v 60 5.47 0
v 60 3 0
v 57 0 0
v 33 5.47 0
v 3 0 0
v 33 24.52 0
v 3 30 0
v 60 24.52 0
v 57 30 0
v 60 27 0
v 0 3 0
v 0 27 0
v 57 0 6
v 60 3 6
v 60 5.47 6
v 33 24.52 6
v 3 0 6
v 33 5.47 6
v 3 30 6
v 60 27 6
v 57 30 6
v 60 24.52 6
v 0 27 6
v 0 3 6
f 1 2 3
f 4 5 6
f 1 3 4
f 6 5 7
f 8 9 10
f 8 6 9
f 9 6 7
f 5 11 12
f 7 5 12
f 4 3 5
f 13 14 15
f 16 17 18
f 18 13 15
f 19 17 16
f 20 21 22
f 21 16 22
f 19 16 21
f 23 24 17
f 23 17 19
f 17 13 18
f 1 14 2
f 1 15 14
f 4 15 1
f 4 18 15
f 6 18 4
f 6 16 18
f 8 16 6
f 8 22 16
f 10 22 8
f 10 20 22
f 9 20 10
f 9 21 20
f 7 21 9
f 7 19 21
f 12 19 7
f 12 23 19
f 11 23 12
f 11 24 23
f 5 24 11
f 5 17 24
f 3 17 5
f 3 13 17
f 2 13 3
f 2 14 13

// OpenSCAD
$fn = 32;

// ----------------------------------------------------------------------
// C washer: 60 x 30 mm plate with an open slot
// ----------------------------------------------------------------------

// --- parameters (mm) ---
profile_height = 6;       // extrusion height
profile_points = 12;      // points of the closed outline

profile = [[3, 0], [57, 0], [60, 3], [60, 5.47], [33, 5.47], [33, 24.52], [60, 24.52], [60, 27], [57, 30], [3, 30], [0, 27], [0, 3]];  // single closed polygon, 12 points, counter clockwise

// --- the one profile operation ---
linear_extrude(height = profile_height) polygon(points = profile);
